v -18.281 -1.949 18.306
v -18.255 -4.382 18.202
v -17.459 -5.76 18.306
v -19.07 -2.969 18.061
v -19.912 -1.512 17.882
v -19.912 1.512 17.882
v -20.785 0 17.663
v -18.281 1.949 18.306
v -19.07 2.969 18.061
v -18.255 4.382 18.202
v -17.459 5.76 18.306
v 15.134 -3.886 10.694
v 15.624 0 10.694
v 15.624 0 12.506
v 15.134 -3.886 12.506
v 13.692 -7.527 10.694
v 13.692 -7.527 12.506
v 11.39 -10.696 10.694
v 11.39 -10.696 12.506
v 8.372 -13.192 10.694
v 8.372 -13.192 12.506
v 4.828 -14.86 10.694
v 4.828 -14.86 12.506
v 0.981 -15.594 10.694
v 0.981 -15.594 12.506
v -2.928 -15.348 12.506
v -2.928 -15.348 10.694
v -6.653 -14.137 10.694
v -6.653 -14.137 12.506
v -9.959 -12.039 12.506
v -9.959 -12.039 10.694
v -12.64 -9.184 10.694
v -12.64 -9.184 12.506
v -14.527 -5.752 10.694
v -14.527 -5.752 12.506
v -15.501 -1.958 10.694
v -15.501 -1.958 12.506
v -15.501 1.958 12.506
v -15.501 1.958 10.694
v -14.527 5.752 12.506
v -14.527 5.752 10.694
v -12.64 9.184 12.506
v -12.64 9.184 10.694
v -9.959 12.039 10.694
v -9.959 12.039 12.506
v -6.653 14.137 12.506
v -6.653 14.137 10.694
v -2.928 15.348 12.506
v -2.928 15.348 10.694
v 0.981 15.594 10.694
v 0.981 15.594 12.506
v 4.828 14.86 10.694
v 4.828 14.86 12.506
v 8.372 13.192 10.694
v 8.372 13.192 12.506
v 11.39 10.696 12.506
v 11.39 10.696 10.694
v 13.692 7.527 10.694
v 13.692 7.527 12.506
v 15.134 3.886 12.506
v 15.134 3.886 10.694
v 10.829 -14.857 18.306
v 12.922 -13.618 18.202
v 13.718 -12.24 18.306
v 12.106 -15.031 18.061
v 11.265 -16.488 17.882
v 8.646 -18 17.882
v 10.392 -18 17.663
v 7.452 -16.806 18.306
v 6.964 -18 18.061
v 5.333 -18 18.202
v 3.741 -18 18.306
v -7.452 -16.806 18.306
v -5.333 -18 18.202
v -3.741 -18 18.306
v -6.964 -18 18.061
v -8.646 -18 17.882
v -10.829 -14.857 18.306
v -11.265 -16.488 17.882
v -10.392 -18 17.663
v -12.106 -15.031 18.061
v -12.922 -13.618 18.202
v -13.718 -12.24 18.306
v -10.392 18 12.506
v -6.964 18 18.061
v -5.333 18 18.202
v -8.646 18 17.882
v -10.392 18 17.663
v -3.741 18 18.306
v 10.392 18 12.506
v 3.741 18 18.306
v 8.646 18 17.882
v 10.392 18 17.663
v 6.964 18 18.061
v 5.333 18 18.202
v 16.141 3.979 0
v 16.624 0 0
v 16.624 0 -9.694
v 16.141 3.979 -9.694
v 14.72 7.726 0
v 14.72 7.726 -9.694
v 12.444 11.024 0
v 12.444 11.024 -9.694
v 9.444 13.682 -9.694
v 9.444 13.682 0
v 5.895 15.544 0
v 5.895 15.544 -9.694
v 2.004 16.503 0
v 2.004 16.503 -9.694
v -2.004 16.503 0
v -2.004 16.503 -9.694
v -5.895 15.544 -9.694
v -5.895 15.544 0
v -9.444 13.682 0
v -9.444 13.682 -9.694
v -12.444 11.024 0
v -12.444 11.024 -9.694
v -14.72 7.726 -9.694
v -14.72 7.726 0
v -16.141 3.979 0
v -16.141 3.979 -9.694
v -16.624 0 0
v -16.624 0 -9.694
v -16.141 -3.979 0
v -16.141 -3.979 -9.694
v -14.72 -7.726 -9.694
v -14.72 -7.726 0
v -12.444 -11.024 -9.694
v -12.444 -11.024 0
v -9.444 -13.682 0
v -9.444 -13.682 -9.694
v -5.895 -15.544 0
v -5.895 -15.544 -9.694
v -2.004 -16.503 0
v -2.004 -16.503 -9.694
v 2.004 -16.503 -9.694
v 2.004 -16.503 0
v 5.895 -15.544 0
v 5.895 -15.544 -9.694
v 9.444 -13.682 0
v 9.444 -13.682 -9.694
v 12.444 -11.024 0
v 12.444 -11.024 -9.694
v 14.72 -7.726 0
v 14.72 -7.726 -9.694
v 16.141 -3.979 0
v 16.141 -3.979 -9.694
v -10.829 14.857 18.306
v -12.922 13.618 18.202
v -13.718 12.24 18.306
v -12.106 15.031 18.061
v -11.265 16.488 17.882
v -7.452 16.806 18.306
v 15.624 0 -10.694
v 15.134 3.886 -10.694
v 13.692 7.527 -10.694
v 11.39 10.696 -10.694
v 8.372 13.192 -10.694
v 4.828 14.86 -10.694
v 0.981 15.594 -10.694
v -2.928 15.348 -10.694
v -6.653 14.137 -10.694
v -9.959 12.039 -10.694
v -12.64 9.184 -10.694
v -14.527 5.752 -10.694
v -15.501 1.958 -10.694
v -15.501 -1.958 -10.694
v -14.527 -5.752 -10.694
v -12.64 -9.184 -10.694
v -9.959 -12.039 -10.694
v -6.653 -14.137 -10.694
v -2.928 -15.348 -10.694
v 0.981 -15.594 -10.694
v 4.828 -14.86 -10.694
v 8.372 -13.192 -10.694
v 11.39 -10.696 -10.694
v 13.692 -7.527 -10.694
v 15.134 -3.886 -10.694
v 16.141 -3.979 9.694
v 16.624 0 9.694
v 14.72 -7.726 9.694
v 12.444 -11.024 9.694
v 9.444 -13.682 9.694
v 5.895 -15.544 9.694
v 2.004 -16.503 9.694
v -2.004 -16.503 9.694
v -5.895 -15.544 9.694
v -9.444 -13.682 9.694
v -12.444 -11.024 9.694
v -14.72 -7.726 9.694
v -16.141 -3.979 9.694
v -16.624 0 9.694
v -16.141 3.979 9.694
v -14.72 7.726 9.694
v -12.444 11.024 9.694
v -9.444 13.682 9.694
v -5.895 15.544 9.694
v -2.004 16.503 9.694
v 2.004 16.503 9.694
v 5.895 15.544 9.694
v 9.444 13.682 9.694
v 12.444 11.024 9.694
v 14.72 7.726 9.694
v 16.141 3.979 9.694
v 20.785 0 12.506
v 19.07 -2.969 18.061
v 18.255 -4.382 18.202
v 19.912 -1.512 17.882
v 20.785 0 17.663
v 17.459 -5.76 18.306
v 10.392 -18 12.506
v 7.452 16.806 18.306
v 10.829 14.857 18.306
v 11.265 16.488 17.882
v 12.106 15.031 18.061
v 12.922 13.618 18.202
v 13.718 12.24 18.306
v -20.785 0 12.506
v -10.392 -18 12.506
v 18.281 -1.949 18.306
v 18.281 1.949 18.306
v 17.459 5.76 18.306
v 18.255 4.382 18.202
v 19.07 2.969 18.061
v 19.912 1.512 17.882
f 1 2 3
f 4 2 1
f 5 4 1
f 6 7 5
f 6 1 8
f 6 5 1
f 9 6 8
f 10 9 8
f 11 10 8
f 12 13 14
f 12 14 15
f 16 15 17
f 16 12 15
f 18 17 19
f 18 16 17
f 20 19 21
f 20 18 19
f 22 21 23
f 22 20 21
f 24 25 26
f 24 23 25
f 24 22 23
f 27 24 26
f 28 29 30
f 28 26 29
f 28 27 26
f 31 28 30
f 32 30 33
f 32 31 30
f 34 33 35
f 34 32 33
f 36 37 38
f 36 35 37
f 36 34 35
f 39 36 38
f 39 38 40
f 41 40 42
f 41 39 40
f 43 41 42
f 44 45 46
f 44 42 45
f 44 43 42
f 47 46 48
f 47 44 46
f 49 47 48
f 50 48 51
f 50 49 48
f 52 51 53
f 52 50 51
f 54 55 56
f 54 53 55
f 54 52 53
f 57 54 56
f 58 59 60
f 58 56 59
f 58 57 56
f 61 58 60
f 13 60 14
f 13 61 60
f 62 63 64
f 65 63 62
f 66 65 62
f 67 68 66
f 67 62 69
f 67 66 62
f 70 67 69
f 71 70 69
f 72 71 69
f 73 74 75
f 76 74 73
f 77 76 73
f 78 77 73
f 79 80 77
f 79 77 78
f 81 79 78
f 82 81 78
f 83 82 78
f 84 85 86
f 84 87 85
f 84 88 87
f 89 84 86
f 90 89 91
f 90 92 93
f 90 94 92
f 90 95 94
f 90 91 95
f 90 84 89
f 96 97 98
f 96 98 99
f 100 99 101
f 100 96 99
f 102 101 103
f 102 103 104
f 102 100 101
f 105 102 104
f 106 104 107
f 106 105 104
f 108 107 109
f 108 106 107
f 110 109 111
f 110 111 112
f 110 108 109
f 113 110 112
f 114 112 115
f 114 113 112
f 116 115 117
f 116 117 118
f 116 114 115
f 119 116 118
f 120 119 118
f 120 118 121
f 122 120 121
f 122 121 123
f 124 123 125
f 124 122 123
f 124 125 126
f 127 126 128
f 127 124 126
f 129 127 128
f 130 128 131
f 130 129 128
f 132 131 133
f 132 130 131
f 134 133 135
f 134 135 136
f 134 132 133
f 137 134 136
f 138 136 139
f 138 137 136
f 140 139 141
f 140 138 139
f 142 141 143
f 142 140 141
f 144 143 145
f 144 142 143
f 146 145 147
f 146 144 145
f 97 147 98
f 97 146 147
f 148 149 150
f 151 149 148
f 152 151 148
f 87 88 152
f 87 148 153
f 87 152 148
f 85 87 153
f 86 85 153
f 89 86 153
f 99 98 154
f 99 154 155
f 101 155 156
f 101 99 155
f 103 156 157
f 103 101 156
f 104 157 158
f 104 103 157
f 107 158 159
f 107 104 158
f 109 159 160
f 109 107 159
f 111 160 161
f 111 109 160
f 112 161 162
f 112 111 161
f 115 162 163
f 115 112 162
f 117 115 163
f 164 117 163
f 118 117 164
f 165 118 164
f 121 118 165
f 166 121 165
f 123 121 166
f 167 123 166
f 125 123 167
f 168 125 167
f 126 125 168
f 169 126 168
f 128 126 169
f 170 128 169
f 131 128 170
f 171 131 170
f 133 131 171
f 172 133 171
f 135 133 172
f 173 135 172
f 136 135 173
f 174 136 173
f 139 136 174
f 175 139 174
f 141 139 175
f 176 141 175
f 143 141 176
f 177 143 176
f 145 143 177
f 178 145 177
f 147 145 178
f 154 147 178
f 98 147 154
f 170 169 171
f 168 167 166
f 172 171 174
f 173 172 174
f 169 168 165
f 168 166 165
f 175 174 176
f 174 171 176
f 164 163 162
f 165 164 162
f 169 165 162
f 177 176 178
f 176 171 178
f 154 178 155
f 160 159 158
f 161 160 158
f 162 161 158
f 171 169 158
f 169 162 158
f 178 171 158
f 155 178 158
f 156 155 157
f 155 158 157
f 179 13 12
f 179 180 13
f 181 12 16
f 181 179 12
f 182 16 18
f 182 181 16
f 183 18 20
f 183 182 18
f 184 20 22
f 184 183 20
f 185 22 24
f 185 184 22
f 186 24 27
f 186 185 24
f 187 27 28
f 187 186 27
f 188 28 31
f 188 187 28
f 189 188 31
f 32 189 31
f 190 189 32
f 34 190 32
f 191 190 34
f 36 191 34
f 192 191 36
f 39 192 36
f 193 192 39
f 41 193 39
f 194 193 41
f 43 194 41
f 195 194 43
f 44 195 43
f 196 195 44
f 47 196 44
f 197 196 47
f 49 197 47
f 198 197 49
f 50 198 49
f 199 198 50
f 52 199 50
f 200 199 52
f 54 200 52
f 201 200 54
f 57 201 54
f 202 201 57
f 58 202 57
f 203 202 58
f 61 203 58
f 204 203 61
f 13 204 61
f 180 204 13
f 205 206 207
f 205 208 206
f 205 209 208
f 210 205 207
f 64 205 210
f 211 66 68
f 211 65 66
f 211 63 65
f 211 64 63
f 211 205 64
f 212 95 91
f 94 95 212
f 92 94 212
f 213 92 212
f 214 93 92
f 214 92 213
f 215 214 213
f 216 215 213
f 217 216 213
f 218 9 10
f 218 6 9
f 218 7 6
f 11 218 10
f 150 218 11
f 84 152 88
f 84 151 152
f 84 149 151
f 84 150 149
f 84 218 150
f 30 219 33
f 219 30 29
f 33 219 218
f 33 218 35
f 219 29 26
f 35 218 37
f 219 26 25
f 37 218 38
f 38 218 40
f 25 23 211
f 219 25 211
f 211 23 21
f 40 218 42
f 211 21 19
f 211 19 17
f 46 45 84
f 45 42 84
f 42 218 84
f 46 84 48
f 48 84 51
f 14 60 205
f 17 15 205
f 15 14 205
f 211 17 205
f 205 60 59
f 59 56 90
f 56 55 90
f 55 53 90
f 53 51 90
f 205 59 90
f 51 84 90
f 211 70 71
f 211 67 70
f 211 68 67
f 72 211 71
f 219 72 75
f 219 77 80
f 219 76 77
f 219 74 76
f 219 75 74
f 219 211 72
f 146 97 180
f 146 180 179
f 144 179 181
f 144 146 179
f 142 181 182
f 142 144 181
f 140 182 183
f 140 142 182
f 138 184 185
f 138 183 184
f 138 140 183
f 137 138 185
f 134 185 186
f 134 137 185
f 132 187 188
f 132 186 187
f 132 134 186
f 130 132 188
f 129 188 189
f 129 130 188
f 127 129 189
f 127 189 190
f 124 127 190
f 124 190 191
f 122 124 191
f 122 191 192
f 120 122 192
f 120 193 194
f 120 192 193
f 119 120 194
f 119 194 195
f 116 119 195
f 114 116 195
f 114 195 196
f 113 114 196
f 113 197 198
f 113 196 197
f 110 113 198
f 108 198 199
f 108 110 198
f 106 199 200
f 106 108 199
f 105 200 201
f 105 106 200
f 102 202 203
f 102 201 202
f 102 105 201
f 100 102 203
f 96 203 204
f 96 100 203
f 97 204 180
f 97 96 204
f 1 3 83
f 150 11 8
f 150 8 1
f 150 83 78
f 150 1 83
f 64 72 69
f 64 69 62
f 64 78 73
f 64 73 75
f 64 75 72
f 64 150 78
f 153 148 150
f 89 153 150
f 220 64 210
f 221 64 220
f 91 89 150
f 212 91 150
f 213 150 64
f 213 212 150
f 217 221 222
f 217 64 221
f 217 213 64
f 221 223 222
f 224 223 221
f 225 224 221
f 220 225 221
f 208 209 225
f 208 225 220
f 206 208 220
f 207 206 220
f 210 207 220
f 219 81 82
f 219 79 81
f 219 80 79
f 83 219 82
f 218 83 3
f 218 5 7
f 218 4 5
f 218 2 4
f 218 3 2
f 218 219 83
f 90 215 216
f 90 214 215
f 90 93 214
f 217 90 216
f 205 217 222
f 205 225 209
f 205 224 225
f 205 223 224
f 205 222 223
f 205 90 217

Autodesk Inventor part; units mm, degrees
ref_plane "YZ Plane" through (0, 0, 0) normal (1, 0, 0) x (0, 1, 0)
ref_plane "XZ Plane" through (0, 0, 0) normal (0, 1, 0) x (-1, 0, 0)
ref_plane "XY Plane" through (0, 0, 0) normal (0, 0, 1) x (1, 0, 0)
sketch "Szkic7" plane through (0, 0, 0) normal (0, 0, 1) x (1, 0, 0)
  circle A0 centre (0, 0) radius 16.6245
  dimension "d35" = 33.249
extrude "Wyciągnięcie proste2" add sketch "Szkic7" along normal mid plane 21.3875
chamfer "Faza2" distance 1 angle 45 1 edges at (-16.6245, 0, 10.6938)
sketch "Szkic9" plane through (0, 0, 10.6938) normal (0, 0, 1) x (1, 0, 0)
  circle A0 centre (0, 0) radius 15.6245 projected
extrude "Wyciągnięcie proste3" add sketch "Szkic9" along normal blind 1.8125
sketch "Szkic10" plane through (0, 0, 12.5063) normal (0, 0, 1) x (1, 0, 0)
  line L0 (-10.3923, 18) -> (10.3923, 18)
  line L1 (10.3923, 18) -> (20.7846, 0)
  line L2 (20.7846, 0) -> (10.3923, -18)
  line L3 (10.3923, -18) -> (-10.3923, -18)
  line L4 (-10.3923, -18) -> (-20.7846, 0)
  line L5 (-20.7846, 0) -> (-10.3923, 18)
  line L6 (0, 23.2743) -> (0, -23.2743) construction
  line L7 (-23.2743, 0) -> (23.2743, 0) construction
  point P0 (0, 0)
  point P1 (0, 0)
  point P2 (0, 18)
  dimension "d44" = 36
extrude "Wyciągnięcie proste4" add sketch "Szkic10" along normal blind 5.8
sketch "Szkic12" plane through (0, 0, 0) normal (0, 1, 0) x (-1, 0, 0)
  line L0 (0, -2.1463) -> (0, 12.8775) construction
  line L1 (-10.3923, 12.5063) -> (-10.3923, 18.3063) construction
  line L2 (-20.7846, 18.3063) -> (-10.3923, 18.3063) construction
  line L3 (-20.7846, 12.5063) -> (-20.7846, 18.3063) projected
  line L4 (-20.7846, 17.6632) -> (-18.3846, 18.3063)
  line L5 (-20.7846, 18.3063) -> (-10.3923, 18.3063) projected
  line L6 (-20.7846, 12.5063) -> (-10.3923, 12.5063) projected
  point P0 (0, 0)
  dimension "d50" = 15
  dimension "d51" = 2.4
revolve "Obrót2" cut sketch "Szkic12" angle 360 about axis through (0, 0, -10) along (0, 0, 1)
thread "Gwint3" size "G33.249x2.309" designation "G 1" class "A" standard "ISO Pipe Threads" full length
chamfer "Faza3" distance 1 angle 45 1 edges at (-16.6245, 0, -10.6938)
equation "\"d35\" = OD"
equation "\"d36\" = 0.7375 * L"
equation "\"d42\" = 0.0625 * L"
equation "\"d44\" = SW"
equation "\"d45\" = 0.2 * L"
equation "\"d51\" = 0.0666667 * SW"
equation "\"SzerokośćGięciaPodcięcia\" = Grubość"
equation "\"RozmiarPodcięciaNarożnika\" = 4 * Grubość"
equation "\"PromieńPrzejścia\" = PromieńGięcia"
equation "\"Rozmiar_promienia_Jacobiego\" = PromieńGięcia"
equation "\"Wielk_odstępu\" = Grubość"
equation "\"d2\" = PromieńGięcia"
equation "\"d23\" = PromieńGięcia"
equation "\"OD\" = 33.249"
equation "\"SW\" = 36"
equation "\"L\" = 29"
equation "\"Grubość\" = 1.5"
equation "\"PromieńGięcia\" = 3"
properties part number "Korek sześciokątny BSP 1'' L=29" material "304"
